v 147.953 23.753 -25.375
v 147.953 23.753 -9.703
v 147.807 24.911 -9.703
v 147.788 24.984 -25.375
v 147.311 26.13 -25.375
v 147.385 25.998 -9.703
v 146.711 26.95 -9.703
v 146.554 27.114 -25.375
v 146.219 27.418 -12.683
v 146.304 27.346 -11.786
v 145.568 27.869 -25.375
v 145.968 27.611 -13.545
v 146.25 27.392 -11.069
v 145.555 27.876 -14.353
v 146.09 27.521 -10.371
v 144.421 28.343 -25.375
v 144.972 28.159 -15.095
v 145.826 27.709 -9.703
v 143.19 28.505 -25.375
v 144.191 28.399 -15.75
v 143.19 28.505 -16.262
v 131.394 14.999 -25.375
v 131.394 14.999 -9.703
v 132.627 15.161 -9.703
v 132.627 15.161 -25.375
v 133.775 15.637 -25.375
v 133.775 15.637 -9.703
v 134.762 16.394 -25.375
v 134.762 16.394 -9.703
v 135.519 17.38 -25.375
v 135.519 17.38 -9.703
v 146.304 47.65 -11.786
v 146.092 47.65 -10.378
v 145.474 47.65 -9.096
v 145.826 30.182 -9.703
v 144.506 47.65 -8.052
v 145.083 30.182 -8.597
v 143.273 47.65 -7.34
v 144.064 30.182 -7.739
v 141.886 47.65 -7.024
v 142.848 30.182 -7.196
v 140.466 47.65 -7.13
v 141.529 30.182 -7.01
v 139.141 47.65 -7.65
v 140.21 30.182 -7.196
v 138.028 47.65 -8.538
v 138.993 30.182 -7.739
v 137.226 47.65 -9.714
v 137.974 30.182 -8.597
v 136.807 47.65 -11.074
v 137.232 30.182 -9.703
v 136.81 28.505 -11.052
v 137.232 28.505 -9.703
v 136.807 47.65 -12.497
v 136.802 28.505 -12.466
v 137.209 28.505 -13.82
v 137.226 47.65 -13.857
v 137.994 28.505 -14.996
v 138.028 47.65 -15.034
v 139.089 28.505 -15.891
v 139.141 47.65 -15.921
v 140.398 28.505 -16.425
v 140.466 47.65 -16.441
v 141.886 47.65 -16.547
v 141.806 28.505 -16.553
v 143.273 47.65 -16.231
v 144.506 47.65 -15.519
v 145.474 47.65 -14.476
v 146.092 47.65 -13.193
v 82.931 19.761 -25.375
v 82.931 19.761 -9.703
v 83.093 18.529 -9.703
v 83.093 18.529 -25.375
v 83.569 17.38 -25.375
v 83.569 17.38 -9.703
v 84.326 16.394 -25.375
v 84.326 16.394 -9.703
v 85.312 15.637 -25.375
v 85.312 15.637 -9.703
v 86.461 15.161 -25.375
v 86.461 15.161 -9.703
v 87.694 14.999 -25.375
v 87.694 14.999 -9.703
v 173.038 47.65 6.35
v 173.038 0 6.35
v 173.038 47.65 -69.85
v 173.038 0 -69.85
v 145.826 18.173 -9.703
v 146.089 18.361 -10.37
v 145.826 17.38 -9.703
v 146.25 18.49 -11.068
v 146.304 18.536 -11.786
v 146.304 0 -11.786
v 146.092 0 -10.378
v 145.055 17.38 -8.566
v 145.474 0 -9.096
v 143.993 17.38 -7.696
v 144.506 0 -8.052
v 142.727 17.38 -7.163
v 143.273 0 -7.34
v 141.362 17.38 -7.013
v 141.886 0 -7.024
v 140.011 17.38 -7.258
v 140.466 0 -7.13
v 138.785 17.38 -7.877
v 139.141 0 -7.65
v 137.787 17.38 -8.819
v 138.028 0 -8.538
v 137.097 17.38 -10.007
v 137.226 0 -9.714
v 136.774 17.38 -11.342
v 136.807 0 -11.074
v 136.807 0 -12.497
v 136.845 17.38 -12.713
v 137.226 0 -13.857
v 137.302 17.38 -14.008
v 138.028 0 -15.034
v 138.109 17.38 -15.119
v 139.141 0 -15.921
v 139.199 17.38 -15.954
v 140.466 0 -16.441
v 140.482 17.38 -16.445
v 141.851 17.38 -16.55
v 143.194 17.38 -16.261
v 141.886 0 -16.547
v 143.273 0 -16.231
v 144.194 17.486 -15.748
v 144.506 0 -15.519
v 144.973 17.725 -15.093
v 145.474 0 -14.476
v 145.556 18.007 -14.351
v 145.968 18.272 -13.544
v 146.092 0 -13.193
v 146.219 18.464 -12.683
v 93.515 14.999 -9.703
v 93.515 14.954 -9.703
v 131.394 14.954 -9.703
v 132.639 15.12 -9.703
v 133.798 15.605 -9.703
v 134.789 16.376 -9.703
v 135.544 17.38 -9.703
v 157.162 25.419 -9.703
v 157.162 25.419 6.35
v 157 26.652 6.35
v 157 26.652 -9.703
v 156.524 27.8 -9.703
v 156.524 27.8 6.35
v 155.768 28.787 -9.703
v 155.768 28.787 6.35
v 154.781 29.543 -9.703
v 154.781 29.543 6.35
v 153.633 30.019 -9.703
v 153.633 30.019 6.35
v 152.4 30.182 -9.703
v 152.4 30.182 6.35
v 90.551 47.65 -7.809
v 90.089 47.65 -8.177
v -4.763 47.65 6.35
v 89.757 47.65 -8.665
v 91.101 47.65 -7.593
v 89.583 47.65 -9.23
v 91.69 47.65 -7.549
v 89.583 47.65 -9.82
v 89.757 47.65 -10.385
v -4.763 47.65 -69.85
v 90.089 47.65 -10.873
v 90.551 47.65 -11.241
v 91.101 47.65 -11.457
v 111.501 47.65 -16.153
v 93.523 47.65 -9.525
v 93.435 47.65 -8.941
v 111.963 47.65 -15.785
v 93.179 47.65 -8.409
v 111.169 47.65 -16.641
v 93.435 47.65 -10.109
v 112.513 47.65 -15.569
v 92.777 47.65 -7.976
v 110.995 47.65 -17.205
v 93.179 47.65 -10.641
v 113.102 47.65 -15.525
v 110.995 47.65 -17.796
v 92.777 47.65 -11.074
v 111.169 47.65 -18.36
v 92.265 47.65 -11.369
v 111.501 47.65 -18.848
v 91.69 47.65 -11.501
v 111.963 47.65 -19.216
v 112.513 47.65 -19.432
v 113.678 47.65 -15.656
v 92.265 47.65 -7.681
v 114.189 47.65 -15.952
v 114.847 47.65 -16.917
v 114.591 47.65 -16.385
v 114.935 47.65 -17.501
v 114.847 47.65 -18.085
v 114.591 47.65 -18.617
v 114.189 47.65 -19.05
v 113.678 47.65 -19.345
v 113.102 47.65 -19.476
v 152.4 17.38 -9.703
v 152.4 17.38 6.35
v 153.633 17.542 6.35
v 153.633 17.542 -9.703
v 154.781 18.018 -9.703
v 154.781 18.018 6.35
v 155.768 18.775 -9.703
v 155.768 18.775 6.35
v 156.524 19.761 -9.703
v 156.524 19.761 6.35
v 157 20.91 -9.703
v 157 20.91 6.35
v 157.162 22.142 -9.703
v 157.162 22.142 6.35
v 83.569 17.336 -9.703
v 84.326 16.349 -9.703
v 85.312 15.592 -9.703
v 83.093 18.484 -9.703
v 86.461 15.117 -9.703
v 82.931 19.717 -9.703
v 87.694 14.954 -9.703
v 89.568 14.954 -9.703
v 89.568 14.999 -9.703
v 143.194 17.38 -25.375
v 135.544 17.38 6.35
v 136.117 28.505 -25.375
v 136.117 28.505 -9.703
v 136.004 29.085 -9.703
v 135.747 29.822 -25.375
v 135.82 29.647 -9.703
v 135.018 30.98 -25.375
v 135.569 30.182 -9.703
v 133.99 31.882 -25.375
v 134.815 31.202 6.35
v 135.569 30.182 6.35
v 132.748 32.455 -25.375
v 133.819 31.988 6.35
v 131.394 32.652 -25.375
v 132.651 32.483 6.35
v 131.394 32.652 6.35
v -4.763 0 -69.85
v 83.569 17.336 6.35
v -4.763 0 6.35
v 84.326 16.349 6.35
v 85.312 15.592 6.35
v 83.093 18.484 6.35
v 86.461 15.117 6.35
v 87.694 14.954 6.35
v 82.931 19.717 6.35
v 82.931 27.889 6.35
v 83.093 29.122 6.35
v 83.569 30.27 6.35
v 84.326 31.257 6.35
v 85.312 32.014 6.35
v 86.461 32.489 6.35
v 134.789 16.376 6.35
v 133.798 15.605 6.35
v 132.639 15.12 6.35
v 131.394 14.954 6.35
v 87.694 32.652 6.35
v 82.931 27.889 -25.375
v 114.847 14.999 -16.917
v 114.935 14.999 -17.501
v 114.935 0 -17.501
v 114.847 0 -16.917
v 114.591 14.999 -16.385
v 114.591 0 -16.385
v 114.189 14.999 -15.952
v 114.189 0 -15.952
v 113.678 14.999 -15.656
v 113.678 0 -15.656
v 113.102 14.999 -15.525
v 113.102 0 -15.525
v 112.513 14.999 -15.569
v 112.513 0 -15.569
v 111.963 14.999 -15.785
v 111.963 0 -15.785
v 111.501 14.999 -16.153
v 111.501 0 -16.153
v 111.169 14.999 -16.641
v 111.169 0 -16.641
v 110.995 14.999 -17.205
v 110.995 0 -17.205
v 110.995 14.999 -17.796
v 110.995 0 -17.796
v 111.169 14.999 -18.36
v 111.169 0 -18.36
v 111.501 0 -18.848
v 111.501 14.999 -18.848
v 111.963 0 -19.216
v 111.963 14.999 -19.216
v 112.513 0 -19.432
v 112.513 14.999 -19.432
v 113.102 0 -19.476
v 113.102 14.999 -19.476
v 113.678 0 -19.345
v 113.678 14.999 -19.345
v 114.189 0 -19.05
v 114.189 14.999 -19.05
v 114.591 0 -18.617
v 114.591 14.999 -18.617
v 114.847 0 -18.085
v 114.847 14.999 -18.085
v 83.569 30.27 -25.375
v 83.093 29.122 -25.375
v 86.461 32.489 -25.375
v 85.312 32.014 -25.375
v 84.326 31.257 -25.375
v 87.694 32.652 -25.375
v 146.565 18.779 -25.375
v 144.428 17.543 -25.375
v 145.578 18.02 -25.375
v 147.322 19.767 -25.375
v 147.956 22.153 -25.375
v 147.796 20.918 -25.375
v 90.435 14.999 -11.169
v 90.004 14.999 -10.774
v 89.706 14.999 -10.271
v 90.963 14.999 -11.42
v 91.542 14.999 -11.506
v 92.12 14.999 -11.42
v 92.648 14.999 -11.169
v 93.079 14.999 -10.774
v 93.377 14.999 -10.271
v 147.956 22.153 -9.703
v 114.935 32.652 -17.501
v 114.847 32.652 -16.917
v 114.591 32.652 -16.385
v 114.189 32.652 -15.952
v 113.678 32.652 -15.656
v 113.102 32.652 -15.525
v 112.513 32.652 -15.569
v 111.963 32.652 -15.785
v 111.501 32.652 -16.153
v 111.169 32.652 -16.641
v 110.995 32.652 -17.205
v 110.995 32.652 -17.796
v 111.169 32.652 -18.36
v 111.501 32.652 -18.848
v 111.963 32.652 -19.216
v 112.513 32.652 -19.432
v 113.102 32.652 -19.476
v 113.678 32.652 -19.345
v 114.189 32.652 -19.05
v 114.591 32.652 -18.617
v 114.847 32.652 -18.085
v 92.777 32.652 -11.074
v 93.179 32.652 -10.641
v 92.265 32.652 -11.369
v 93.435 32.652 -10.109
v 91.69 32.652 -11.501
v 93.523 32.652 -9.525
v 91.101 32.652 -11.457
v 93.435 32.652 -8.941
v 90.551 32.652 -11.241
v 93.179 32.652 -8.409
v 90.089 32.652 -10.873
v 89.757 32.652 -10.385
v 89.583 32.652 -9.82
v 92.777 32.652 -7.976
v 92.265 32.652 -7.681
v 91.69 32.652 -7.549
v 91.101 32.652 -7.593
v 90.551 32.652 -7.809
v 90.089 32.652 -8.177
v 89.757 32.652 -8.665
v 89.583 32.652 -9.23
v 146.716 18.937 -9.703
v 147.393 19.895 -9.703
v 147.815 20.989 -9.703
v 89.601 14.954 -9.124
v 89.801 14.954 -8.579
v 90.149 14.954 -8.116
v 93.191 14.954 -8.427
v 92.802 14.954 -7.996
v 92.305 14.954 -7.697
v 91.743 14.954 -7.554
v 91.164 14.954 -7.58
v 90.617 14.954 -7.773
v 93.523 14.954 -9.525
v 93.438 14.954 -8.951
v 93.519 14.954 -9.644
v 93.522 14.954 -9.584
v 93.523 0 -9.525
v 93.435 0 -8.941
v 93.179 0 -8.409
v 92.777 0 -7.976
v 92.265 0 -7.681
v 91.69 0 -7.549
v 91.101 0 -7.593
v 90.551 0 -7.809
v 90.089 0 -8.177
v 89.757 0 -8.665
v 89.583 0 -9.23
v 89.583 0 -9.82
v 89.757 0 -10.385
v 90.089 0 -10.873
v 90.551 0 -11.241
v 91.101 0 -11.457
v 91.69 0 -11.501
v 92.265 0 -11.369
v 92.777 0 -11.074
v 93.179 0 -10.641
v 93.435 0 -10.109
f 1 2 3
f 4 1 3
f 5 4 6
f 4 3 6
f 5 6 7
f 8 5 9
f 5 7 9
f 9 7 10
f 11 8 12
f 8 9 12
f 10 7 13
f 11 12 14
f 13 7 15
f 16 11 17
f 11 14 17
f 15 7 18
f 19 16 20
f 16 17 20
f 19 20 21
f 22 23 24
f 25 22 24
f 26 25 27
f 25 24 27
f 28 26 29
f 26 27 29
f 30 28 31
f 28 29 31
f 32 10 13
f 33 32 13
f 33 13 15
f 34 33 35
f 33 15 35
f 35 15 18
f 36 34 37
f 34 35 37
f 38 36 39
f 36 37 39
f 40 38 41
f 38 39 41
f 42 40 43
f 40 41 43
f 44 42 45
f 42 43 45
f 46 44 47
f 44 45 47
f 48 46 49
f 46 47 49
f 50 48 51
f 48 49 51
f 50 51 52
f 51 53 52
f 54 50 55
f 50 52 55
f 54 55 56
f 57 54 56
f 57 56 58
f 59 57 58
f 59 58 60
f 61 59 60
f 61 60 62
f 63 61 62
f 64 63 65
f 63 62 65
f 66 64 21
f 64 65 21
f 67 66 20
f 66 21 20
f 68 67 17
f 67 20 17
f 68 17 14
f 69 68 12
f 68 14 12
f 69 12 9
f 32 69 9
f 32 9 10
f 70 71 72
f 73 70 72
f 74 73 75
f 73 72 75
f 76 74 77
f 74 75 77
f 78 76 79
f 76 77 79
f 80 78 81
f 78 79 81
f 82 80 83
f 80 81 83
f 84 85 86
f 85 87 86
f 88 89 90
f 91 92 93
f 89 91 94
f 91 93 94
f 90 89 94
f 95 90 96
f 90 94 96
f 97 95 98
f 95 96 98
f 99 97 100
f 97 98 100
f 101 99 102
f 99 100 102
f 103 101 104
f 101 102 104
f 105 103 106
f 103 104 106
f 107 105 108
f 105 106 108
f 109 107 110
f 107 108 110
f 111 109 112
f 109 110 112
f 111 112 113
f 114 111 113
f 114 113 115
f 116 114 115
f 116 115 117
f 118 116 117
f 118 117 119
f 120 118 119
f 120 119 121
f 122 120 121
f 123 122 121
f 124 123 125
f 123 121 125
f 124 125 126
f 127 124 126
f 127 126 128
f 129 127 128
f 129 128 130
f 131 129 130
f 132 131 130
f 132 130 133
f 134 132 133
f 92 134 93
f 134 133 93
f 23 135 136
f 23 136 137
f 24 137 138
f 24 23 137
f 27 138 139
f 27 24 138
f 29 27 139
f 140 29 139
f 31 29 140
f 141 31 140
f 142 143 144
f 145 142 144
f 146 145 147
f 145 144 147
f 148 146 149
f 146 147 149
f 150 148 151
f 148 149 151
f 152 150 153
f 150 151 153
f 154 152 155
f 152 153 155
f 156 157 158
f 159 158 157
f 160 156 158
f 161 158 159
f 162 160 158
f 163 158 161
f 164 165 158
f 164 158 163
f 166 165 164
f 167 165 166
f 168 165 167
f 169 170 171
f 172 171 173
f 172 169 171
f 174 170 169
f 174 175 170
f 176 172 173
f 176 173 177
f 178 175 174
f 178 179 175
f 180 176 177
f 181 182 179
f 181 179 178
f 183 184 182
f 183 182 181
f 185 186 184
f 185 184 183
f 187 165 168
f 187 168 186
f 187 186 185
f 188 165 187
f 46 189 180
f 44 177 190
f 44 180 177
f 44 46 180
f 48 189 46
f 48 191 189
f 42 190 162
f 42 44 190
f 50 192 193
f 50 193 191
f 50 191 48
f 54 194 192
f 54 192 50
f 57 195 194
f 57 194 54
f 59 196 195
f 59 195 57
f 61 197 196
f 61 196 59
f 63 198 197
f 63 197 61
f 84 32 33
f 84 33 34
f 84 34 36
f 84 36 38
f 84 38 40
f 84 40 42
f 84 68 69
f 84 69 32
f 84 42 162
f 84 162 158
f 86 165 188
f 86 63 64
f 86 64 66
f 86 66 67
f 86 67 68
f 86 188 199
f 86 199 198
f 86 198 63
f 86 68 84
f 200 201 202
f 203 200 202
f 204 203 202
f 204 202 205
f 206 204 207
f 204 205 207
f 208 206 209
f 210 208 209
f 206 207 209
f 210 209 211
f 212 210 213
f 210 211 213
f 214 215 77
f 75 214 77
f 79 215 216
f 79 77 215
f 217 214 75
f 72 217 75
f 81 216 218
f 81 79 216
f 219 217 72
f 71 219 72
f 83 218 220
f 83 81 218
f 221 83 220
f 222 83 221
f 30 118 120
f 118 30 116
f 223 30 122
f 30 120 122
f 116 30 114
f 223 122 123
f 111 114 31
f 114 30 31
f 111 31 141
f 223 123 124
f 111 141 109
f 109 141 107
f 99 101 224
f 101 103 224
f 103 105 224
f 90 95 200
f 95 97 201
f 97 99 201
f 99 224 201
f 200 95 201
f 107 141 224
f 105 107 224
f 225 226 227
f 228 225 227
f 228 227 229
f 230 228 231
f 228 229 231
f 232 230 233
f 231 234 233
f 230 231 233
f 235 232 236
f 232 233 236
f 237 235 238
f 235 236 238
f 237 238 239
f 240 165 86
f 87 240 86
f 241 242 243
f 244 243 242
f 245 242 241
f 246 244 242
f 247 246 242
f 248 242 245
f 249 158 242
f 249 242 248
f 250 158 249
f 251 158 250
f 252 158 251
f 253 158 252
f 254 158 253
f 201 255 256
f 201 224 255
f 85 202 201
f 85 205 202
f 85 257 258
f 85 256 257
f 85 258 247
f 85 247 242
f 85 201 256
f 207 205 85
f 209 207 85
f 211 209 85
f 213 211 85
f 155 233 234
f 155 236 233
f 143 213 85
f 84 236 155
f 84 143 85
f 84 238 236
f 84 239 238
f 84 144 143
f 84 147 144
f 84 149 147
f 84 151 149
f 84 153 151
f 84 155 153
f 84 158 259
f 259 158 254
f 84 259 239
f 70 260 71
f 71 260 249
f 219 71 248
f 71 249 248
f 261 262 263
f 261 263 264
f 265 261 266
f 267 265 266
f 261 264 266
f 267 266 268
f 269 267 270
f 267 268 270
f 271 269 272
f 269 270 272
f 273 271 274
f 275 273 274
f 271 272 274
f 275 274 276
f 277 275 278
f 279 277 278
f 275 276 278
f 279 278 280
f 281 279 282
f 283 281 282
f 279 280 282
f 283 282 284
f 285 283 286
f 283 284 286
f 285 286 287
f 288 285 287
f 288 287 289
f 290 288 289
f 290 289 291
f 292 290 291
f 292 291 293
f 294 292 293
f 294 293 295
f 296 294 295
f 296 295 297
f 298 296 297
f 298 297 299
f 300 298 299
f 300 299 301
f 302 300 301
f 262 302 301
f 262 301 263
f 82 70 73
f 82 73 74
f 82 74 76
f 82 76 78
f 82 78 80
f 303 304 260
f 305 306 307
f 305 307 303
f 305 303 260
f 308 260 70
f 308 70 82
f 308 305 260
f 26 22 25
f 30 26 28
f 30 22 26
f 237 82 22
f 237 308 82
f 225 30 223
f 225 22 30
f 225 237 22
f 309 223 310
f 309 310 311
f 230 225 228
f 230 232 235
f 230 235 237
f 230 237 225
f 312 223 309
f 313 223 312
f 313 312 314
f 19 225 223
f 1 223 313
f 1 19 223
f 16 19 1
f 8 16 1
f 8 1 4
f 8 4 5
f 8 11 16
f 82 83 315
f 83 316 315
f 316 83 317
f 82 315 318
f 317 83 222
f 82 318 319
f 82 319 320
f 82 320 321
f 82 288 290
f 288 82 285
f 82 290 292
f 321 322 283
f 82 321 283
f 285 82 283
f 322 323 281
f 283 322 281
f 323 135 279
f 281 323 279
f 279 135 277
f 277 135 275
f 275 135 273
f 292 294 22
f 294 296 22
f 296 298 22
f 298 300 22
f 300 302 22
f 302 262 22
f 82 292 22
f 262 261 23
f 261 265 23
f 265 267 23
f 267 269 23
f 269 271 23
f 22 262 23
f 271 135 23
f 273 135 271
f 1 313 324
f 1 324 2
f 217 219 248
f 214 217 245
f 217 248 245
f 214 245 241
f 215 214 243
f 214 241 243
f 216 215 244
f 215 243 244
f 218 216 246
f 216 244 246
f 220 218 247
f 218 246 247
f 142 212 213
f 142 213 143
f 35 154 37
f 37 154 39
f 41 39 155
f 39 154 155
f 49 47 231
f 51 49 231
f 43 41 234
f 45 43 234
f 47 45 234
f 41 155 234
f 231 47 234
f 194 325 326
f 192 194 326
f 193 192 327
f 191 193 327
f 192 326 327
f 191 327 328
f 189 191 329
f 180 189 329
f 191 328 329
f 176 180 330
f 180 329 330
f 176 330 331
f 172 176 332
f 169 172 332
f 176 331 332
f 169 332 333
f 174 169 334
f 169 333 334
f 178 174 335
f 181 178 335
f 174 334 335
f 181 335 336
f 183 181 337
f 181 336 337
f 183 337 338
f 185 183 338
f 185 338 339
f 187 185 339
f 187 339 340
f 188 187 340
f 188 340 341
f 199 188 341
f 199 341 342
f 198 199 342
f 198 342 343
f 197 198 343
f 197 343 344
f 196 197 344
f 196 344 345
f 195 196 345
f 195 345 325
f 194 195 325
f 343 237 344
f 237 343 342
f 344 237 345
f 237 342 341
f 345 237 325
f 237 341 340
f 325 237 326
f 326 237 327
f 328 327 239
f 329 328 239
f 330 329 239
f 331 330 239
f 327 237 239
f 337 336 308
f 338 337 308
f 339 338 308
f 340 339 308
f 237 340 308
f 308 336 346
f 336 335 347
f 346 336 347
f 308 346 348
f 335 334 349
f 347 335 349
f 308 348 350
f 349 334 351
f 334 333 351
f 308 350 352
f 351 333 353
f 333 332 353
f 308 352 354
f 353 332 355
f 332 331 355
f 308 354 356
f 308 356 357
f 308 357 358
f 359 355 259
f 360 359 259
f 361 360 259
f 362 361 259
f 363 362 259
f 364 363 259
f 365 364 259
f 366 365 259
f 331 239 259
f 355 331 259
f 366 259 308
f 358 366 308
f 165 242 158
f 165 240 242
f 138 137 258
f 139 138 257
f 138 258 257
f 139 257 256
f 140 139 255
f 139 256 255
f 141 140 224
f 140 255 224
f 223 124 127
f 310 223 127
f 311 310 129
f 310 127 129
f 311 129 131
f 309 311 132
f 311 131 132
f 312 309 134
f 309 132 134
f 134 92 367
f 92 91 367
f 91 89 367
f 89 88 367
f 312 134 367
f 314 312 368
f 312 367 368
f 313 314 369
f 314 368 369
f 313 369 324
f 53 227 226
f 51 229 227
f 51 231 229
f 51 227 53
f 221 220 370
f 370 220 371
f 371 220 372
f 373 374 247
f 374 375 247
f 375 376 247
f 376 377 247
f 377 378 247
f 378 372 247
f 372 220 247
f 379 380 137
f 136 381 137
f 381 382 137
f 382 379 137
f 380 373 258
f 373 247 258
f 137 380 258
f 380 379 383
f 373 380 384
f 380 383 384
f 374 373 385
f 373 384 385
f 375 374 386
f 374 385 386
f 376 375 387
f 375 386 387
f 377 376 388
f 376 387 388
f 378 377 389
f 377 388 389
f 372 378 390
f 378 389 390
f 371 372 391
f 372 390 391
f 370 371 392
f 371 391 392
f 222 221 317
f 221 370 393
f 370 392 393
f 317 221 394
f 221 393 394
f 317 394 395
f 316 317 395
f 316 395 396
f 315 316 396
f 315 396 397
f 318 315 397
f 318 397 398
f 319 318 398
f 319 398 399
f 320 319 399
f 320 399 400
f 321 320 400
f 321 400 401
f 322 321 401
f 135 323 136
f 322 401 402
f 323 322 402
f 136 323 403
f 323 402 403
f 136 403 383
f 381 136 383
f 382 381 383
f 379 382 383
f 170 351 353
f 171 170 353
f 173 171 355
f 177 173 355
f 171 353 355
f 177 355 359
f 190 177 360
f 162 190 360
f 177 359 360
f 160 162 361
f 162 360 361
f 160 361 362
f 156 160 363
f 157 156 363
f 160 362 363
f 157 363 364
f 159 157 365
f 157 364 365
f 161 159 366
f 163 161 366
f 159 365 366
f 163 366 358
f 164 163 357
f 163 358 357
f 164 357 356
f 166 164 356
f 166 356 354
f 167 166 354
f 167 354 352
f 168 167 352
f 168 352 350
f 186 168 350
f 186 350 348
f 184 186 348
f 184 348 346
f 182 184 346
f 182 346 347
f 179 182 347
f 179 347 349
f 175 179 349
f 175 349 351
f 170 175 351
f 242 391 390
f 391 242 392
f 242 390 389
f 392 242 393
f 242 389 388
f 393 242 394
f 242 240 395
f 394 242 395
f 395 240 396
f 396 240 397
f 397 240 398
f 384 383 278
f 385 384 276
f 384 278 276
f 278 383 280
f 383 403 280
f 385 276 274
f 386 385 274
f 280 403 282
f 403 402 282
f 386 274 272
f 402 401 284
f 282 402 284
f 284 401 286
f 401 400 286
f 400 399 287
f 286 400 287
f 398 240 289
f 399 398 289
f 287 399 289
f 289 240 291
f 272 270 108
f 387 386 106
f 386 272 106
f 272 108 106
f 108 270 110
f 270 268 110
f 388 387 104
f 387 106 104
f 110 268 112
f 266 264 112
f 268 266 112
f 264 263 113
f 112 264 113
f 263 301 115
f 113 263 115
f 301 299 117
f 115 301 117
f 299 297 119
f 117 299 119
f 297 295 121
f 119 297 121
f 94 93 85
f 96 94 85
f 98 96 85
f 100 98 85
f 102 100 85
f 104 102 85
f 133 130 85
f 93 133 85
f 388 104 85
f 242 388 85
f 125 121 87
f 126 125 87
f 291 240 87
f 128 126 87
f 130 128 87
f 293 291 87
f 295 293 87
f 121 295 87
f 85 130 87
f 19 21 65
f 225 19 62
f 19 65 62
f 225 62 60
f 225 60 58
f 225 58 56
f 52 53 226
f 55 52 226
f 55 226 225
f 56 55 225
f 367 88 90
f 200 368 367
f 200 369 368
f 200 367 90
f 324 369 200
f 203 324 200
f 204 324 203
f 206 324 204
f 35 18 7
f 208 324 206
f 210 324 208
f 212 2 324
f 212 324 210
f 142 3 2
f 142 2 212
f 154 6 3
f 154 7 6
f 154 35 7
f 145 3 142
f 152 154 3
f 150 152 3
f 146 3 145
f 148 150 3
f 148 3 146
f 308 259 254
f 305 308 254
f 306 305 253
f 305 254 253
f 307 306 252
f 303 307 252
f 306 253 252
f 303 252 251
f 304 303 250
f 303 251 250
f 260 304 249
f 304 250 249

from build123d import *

# Parameters (mm, degrees)
F0_W          = 177.8
F0_H          = 47.6504
F1_DEPTH      = 69.85
F1_DEPTH_BACK = 6.35
F2_R          = 4.7752
F2_R_2        = 1.9812
F3_DEPTH      = 47.6514
F5_DEPTH      = 16.0528
F7_DEPTH      = 31.7246


with BuildPart() as f1:
    # F0 (on Top) → F1 (new body, two sides)
    with BuildSketch(Plane.XY) as f1_sk:
        with Locations((84.1375, 23.8252)):
            Rectangle(F0_W, F0_H)
    extrude(amount=-F1_DEPTH)
    extrude(f1_sk.sketch, amount=F1_DEPTH_BACK)

    # F2 (on Front) → F3 (cut, through all)
    with BuildSketch(Plane.XZ):
        with Locations((141.5288, -11.7856)):
            Circle(F2_R)
        with Locations((112.9538, -17.5006)):
            Circle(F2_R_2)
        with Locations((91.5416, -9.525)):
            Circle(F2_R_2)
    extrude(amount=-F3_DEPTH, mode=Mode.SUBTRACT)

    # F4 (on face) → F5 (cut)
    with BuildSketch(Plane.XY.offset(6.35)):
        with BuildLine():
            Line((131.3942, 32.60725), (87.6935, 32.60725))
            ThreePointArc((87.6935, 32.60725), (84.3259039546, 31.2123460454), (82.931, 27.84475))
            Line((82.931, 27.84475), (82.931, 19.71675))
            ThreePointArc((82.931, 19.71675), (84.3259039546, 16.3491539546), (87.6935, 14.95425))
            Line((87.6935, 14.95425), (131.3942, 14.95425))
            ThreePointArc((131.3942, 14.95425), (133.7975722402, 15.6051556468), (135.5439918032, 17.37995))
            Line((135.5439918032, 17.37995), (152.4, 17.37995))
            ThreePointArc((152.4, 17.37995), (155.7675960454, 18.7748539546), (157.1625, 22.14245))
            Line((157.1625, 22.14245), (157.1625, 25.41905))
            ThreePointArc((157.1625, 25.41905), (155.7675960454, 28.7866460454), (152.4, 30.18155))
            Line((152.4, 30.18155), (135.5439918032, 30.18155))
            ThreePointArc((135.5439918032, 30.18155), (133.7975722402, 31.9563443532), (131.3942, 32.60725))
        make_face()
    extrude(amount=-F5_DEPTH, mode=Mode.SUBTRACT)

    # F6 (on face) → F7 (cut)
    with BuildSketch(Plane.XY.offset(6.35)):
        with BuildLine():
            Line((143.1901861236, 28.50515), (136.1167005926, 28.50515))
            ThreePointArc((136.1167005926, 28.50515), (134.5364877315, 31.467947555), (131.3942, 32.6517))
            Line((131.3942, 32.6517), (87.6935, 32.6517))
            ThreePointArc((87.6935, 32.6517), (84.3259039546, 31.2567960454), (82.931, 27.8892))
            Line((82.931, 27.8892), (82.931, 19.7612))
            ThreePointArc((82.931, 19.7612), (84.3259039546, 16.3936039546), (87.6935, 14.9987))
            Line((87.6935, 14.9987), (131.3942, 14.9987))
            ThreePointArc((131.3942, 14.9987), (133.77545, 15.6367540145), (135.5186459855, 17.37995))
            Line((135.5186459855, 17.37995), (143.1937903656, 17.37995))
            ThreePointArc((143.1937903656, 17.37995), (146.5651768038, 18.7786486185), (147.9562782851, 22.1531768833))
            Line((147.9562782851, 22.1531768833), (147.9526740432, 23.7533768833))
            ThreePointArc((147.9526740432, 23.7533768833), (146.5539875051, 27.1140364382), (143.1901861236, 28.50515))
        make_face()
    extrude(amount=-F7_DEPTH, mode=Mode.SUBTRACT)


solid = f1.part
